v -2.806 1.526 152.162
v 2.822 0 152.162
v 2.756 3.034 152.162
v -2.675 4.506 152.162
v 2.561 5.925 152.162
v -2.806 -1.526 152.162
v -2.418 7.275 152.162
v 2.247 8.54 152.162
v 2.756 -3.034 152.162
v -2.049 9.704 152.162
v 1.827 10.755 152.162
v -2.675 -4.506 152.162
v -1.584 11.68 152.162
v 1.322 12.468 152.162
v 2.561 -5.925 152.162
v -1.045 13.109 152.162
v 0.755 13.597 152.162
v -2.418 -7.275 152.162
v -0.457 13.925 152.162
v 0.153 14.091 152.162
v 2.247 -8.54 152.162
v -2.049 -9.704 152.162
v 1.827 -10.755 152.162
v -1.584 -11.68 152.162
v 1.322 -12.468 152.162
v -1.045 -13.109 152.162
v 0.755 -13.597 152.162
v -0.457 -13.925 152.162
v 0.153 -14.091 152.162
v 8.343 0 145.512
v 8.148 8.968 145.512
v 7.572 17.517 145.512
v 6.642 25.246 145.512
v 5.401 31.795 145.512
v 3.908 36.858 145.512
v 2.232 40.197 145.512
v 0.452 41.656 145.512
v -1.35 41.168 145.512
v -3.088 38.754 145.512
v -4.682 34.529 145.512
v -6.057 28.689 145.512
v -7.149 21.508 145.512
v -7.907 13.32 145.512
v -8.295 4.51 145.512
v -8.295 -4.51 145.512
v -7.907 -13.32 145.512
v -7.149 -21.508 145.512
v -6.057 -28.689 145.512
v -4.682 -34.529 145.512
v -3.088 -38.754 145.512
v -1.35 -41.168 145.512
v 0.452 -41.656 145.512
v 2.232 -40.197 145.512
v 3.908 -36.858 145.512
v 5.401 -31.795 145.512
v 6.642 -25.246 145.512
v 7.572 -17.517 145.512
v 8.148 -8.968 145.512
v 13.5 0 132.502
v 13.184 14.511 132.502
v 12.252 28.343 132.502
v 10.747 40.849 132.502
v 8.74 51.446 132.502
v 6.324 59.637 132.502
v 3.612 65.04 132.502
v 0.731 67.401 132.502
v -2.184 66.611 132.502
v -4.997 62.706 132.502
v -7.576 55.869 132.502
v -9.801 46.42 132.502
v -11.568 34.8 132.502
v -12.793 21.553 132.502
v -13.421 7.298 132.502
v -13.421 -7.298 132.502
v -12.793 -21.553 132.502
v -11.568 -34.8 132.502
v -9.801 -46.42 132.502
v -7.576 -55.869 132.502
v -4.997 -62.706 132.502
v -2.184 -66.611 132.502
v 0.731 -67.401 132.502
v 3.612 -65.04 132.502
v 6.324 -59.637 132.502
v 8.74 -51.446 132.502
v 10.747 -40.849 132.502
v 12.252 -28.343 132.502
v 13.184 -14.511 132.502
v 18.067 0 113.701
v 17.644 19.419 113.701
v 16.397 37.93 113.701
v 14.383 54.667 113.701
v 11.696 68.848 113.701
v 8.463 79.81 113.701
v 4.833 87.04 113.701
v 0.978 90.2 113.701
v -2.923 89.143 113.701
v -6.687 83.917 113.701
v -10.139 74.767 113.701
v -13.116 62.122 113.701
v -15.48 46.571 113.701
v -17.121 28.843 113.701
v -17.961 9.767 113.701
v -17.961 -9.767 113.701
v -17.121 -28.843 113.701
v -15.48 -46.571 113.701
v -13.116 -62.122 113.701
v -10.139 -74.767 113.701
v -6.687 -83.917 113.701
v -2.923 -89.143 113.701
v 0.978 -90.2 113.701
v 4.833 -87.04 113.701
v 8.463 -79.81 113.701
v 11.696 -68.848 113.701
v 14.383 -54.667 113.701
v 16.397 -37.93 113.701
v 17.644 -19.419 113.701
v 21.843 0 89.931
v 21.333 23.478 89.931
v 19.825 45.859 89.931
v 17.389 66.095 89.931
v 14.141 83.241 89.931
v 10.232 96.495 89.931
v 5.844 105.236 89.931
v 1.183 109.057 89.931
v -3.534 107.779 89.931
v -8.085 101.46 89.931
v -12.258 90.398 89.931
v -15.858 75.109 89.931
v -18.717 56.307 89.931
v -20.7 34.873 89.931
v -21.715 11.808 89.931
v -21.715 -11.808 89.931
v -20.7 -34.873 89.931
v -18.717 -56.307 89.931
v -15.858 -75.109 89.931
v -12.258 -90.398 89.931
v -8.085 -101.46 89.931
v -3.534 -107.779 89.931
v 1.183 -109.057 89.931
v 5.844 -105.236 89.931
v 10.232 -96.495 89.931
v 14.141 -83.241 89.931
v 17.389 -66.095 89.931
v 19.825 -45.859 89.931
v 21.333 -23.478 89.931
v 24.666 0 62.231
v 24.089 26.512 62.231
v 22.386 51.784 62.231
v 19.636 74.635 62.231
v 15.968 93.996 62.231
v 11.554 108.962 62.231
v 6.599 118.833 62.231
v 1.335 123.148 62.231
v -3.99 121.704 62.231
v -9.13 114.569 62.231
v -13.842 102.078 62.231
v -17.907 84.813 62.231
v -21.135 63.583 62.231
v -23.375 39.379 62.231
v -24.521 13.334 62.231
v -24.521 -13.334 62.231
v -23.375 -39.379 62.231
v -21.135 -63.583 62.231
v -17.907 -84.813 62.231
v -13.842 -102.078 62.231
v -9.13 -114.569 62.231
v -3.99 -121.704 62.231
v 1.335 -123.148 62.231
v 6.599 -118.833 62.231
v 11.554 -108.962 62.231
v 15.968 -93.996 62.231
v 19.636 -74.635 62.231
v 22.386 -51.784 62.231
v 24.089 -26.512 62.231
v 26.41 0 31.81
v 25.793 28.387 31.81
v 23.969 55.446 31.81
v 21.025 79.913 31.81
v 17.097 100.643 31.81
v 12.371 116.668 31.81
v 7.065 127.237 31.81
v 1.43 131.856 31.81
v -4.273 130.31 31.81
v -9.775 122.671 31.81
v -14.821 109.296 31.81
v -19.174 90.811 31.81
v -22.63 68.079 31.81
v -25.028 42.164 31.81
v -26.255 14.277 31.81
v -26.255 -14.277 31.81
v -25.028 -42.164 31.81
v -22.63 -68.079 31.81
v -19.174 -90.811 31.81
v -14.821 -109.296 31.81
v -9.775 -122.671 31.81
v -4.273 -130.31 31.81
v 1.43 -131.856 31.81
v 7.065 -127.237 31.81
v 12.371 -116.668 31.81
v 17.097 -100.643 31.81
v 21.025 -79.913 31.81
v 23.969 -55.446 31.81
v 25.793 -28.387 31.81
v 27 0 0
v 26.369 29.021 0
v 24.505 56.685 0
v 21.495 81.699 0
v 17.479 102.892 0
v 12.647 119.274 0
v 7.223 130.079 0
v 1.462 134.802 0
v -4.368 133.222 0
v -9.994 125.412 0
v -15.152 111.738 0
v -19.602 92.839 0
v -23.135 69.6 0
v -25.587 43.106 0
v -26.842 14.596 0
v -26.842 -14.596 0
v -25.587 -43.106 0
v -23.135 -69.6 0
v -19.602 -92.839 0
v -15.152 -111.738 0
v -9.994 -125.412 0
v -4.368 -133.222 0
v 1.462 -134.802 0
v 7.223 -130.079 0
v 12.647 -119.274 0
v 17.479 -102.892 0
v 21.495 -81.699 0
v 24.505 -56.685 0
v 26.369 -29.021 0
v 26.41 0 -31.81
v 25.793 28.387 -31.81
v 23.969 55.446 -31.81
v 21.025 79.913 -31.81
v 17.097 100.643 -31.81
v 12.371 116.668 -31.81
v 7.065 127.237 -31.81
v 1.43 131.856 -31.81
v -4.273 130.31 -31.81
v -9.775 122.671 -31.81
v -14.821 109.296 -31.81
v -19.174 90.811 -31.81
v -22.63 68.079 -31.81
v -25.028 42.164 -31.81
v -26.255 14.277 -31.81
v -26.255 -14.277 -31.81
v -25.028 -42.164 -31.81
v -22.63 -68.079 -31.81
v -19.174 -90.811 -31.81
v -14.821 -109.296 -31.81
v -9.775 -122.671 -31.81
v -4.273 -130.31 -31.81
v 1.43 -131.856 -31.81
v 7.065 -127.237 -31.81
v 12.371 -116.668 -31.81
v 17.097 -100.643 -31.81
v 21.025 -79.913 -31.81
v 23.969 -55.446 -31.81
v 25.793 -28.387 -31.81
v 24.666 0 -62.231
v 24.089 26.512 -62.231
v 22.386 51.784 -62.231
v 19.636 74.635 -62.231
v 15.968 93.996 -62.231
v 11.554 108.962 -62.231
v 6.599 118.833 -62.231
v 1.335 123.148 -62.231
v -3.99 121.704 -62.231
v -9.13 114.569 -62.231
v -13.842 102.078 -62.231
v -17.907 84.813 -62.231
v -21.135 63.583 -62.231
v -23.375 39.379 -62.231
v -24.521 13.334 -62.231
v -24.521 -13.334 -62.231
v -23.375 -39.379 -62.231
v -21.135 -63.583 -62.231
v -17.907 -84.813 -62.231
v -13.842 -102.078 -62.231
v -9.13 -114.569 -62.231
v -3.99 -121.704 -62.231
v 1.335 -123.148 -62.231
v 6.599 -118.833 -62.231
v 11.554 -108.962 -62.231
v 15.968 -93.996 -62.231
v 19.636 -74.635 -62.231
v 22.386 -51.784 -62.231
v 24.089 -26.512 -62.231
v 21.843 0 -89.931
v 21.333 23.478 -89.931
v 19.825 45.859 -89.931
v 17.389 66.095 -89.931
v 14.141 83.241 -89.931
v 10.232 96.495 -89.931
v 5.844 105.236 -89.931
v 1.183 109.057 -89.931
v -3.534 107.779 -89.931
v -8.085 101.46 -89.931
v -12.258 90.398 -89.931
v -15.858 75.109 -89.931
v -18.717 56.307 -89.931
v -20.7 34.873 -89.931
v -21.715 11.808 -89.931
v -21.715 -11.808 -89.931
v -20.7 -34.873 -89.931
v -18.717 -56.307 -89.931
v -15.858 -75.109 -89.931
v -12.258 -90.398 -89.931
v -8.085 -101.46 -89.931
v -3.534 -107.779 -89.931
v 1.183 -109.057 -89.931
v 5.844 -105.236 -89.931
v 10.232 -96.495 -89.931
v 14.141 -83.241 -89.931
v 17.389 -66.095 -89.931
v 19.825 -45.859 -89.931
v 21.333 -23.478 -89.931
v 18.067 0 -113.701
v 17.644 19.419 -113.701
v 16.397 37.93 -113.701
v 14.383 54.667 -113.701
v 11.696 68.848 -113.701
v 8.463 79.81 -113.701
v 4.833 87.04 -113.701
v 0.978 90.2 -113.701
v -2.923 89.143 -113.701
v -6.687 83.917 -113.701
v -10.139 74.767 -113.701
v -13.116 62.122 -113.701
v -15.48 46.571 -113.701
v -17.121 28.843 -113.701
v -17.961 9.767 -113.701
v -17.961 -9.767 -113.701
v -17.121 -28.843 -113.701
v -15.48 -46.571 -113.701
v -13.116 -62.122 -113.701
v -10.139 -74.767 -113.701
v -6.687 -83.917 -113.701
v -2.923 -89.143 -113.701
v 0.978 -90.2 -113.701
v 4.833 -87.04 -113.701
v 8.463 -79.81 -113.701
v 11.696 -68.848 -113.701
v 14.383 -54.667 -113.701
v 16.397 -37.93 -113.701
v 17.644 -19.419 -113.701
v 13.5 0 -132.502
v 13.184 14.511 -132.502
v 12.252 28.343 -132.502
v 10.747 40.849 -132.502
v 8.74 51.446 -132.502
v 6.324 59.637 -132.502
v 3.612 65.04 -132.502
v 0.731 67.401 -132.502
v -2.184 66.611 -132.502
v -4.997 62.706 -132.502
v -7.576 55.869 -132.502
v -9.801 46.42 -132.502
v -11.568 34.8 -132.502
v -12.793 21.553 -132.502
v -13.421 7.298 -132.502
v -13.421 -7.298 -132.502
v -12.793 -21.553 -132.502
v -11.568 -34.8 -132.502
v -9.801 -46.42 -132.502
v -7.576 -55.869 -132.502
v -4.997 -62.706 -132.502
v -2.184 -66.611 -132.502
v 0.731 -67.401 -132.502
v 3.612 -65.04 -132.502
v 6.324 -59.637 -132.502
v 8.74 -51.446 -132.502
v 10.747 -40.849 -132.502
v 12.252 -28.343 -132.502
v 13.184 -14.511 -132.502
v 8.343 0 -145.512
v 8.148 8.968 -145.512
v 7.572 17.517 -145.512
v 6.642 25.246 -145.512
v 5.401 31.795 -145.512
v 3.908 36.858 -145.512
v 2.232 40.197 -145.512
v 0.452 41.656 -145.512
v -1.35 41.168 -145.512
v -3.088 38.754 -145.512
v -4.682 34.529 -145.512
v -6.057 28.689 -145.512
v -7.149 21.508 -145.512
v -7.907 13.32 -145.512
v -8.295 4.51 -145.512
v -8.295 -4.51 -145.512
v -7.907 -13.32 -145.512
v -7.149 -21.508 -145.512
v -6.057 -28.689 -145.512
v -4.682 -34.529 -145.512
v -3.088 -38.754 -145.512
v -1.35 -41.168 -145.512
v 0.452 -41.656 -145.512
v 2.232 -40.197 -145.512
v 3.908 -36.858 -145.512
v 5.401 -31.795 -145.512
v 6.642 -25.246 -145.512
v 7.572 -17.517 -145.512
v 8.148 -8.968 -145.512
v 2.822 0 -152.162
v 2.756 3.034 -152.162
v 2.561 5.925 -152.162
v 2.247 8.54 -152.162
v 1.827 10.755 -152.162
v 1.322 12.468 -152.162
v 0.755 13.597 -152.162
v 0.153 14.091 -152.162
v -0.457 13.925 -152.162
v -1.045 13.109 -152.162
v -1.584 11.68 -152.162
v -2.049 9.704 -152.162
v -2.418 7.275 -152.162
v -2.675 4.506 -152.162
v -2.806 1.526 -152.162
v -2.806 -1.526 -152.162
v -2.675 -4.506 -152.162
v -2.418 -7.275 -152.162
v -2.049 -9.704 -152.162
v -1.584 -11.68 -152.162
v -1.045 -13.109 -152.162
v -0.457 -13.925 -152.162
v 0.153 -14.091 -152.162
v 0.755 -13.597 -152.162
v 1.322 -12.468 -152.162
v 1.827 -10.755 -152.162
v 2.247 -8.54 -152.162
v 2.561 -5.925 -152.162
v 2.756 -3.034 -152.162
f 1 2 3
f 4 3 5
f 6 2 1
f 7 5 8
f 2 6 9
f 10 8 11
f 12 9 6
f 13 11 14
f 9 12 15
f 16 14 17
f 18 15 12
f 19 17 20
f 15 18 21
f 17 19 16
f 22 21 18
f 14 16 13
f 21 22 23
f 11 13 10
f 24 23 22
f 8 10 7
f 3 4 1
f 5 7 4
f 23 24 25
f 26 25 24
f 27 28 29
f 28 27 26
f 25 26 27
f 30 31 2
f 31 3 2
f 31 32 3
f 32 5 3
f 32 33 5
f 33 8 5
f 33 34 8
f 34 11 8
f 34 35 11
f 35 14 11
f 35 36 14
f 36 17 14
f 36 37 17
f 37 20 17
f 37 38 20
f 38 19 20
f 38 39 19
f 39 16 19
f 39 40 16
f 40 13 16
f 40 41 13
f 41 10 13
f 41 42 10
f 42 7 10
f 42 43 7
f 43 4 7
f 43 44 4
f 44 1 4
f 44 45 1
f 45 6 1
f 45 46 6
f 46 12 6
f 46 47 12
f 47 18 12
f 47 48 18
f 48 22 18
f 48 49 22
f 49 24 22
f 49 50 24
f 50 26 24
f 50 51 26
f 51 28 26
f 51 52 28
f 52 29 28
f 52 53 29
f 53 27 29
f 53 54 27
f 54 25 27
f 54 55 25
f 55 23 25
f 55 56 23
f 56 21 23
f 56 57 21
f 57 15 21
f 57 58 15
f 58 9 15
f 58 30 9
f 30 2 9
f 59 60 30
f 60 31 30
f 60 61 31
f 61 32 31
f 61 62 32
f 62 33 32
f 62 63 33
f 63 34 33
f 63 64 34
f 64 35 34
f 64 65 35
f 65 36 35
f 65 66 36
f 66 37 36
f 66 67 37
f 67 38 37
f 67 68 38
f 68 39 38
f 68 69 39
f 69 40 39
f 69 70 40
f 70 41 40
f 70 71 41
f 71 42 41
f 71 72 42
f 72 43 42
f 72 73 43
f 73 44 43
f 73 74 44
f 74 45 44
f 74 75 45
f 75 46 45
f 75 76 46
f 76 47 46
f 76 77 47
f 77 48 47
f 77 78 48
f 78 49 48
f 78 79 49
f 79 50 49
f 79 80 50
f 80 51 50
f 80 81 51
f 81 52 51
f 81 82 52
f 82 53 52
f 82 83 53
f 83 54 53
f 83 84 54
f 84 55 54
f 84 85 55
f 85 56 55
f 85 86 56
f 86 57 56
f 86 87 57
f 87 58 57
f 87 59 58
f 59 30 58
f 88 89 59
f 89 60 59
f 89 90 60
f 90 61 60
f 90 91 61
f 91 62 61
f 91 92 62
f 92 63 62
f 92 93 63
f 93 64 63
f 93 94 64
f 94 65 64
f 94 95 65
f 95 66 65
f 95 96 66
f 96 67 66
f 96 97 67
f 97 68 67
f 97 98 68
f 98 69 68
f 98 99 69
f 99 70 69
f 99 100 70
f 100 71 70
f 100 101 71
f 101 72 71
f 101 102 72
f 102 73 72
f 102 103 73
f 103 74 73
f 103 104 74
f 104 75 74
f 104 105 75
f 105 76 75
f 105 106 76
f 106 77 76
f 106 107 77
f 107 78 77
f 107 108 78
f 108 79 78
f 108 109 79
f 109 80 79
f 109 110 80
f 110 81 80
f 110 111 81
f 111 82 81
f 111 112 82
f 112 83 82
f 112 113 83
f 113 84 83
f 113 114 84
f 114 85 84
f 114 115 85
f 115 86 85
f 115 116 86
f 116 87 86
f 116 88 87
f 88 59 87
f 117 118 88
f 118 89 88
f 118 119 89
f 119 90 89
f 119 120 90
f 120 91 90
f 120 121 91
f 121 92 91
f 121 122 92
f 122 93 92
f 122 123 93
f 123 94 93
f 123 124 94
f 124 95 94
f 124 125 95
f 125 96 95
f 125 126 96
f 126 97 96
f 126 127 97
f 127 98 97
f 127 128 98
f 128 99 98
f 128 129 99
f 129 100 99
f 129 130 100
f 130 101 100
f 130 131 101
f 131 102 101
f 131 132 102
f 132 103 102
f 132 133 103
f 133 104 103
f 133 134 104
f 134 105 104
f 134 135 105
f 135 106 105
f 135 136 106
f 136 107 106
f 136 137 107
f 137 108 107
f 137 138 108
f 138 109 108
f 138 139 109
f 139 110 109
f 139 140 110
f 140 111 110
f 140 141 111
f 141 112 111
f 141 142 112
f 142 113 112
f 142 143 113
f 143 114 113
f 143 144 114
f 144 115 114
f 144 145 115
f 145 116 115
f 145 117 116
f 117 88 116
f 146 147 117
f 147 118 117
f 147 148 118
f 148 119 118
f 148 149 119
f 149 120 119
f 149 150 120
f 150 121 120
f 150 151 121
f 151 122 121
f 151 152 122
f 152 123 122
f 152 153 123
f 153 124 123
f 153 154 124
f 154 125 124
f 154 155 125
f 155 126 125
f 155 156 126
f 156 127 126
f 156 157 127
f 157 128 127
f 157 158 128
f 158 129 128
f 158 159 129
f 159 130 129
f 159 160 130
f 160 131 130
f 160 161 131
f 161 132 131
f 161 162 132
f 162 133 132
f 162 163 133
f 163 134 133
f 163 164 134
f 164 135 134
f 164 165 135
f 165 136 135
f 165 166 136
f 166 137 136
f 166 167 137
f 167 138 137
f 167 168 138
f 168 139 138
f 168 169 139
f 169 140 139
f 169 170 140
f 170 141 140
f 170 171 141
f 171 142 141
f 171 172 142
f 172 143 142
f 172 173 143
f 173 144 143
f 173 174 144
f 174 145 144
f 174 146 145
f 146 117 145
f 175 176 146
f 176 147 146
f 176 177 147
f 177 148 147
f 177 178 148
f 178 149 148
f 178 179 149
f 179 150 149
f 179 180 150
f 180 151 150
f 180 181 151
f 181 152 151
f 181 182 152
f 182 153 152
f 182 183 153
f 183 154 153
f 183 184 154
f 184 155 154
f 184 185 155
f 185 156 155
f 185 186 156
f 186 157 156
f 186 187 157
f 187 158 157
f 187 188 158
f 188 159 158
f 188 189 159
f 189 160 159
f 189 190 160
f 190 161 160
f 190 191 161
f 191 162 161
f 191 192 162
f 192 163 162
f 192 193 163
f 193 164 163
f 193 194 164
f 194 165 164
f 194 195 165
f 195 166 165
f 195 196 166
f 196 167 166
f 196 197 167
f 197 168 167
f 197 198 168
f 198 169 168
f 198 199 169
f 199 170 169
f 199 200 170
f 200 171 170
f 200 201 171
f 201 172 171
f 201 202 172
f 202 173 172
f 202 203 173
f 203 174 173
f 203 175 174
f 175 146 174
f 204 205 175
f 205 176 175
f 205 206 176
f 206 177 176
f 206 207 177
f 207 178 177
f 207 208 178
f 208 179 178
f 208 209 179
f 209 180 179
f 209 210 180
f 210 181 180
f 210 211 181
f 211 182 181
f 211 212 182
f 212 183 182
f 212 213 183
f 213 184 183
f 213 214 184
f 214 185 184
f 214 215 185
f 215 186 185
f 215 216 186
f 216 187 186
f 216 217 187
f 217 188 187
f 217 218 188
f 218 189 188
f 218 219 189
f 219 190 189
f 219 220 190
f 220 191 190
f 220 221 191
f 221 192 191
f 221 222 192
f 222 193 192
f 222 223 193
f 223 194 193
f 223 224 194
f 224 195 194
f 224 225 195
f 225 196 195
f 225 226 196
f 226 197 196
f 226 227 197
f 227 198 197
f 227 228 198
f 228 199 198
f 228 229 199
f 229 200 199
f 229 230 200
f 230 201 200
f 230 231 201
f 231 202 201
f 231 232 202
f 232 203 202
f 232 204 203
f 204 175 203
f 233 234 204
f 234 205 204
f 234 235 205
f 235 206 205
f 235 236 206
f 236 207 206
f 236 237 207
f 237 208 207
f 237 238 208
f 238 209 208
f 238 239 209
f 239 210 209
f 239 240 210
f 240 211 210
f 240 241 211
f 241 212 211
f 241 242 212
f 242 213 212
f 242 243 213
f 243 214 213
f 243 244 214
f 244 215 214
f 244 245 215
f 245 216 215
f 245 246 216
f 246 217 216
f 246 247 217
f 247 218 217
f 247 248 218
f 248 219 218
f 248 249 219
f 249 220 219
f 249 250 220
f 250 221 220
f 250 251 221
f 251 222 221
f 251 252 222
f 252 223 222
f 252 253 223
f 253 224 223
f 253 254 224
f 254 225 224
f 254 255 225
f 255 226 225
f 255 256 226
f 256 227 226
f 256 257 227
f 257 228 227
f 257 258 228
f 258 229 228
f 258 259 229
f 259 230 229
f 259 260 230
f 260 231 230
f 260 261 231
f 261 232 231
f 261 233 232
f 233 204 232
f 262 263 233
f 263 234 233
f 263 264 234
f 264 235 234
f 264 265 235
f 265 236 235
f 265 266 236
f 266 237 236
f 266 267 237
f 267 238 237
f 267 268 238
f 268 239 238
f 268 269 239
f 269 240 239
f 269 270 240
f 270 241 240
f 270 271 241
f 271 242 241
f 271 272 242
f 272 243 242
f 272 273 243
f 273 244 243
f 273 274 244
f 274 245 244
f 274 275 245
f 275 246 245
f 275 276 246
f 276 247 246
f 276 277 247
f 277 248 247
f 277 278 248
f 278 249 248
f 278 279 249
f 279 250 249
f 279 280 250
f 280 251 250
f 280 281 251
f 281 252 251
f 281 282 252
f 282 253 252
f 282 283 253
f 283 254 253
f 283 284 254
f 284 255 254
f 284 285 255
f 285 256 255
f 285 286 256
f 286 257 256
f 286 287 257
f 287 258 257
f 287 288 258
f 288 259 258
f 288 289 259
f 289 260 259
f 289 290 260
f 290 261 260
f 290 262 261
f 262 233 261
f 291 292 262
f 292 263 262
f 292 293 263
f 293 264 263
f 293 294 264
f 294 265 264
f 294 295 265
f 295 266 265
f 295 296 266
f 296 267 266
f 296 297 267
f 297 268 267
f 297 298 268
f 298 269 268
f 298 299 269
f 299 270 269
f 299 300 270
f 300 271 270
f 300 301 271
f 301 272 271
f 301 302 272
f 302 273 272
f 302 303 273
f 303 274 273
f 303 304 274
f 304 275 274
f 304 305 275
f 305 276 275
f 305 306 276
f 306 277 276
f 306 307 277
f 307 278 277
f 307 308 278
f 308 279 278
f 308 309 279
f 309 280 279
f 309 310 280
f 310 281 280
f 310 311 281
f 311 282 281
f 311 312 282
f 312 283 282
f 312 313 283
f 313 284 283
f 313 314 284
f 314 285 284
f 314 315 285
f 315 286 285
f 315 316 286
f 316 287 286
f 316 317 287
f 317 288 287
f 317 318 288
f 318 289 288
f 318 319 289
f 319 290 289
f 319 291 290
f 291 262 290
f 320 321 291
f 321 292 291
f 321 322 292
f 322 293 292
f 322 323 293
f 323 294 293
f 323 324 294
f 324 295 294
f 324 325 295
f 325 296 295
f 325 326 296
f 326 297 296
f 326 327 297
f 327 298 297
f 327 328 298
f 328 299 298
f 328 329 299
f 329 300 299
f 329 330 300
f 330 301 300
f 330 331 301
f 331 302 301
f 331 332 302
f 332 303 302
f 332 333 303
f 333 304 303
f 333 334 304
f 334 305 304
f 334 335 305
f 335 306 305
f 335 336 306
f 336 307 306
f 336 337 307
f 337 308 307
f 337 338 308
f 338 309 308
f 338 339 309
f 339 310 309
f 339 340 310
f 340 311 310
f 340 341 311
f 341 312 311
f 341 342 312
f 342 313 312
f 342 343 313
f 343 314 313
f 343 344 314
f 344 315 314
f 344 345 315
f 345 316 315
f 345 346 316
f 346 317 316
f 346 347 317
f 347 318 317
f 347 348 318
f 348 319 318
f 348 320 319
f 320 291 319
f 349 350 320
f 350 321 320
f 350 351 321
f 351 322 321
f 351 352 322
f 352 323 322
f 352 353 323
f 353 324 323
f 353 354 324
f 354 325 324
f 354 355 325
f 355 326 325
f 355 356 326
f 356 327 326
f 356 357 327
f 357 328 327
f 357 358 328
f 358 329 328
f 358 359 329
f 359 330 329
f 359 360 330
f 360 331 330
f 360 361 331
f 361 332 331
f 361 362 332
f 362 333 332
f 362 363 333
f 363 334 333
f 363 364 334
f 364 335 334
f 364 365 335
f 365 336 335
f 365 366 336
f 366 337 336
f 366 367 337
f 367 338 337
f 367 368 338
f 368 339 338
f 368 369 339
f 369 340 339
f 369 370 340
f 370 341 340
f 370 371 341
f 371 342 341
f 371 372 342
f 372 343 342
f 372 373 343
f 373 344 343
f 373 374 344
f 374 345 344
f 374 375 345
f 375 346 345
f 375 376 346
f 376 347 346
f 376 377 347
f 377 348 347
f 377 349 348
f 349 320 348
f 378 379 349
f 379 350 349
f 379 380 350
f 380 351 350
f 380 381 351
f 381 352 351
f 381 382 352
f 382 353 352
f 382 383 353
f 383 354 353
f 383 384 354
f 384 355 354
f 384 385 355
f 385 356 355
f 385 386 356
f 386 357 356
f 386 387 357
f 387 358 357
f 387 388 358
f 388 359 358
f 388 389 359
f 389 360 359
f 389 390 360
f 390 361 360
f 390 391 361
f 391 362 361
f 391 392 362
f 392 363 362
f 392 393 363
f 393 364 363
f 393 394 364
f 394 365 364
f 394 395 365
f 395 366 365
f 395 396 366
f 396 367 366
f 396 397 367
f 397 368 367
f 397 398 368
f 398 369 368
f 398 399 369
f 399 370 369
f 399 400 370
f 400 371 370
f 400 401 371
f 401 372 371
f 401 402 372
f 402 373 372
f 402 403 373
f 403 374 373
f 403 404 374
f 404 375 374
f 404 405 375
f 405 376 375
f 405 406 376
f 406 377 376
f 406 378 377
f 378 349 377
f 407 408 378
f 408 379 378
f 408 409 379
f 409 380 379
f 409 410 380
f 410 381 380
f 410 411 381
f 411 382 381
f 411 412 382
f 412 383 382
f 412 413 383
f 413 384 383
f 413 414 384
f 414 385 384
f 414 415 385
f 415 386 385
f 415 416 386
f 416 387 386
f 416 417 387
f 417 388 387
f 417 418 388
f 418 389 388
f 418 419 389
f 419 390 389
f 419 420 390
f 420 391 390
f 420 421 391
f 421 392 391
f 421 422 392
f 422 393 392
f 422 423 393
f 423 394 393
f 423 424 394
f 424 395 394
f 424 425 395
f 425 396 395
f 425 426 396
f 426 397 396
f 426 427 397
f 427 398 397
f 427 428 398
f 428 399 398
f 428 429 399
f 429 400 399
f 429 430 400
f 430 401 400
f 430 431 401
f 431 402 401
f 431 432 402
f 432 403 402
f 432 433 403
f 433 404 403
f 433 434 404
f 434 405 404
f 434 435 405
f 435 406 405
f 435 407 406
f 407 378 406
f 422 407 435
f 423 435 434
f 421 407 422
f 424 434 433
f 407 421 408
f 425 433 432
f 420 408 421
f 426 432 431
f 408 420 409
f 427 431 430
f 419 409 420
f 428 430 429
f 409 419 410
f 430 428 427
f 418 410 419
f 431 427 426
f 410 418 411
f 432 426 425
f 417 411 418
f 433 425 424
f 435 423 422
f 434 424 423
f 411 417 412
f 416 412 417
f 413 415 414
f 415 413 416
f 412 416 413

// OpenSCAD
// Generated by SolidPython 1.0.1 on 2020-07-29 00:46:45


scale(v = [3, 15, 17]) {
	sphere(r = 9);
}
/***********************************************
*********      SolidPython code:      **********
************************************************
 
# import packages: SolidPython
from solid import *
from solid.utils import *
from itertools import chain, combinations, permutations


class Resize:

    def __init__(self, scad_file):
        self.scad_file = scad_file
        #self.scad_file = import_scad(scad_file)
        # cone/cylinder param:
        self.r1 = 0
        self.r2 = 0
        self.h = 0
        # rectangular prism param:
        self.w = 0
        self.l = 0
        # ellipse param:
        self.r = 0

    # import OpenScad code (file name corresponds to shape)


    # classify shape + parameters
    def assign(self, param1, param2, param3):
        if self.scad_file == 'cone.scad':
            self.r1 = param1
            self.r2 = param2
            self.h = param3
        elif self.scad_file == 'cylinder.scad':
            self.r1 = param1
            self.r2 = param2
            self.h = param3
        elif self.scad_file == 'rectangularPrism.scad':
            self.h = param1
            self.l = param2
            self.w = param3
        else:
            self.r = param1
            self.h = param2

    # resize parameters
    def iterate(self):
        x = range(3, 20, 2)
        i = 1
        if self.scad_file == 'cone.scad':
            tempList = list(permutations(x, 2))
            for temp in tempList:
                param1 = temp[0]
                param2 = temp[1]
                filepath = 'produced_scad_files/' + 'cone' + str(param1) + '_' + str(param2) + '_' + '.scad'
                scad_render_to_file(cylinder(h=param1, r1=param2, r2=0), filepath)

        elif self.scad_file == 'cylinder.scad':
            tempList = list(permutations(x, 3))
            for temp in tempList:
                param1 = temp[0]
                param2 = temp[1]
                filepath = 'produced_scad_files/' + 'cylinder' + str(param1) + '_' + str(param2) + '_' + '.scad'
                scad_render_to_file(cylinder(h=param1, r1=param2, r2=param2), filepath)

        elif self.scad_file == 'rectangularPrism.scad':
            tempList = list(permutations(x, 3))
            for temp in tempList:
                param1 = temp[0]
                param2 = temp[1]
                param3 = temp[2]
                filepath = 'produced_scad_files/' + 'rectangularPrism' + str(param1) + '_' + str(param2) + '_' + str(
                    param3) + '.scad'
                scad_render_to_file(cube(size=(param1, param2, param3)), filepath)

        elif self.scad_file == 'ellipse.scad':
            tempList = list(permutations(x, 4))
            for temp in tempList:
                param1 = temp[0]
                param2 = temp[1]
                param3 = temp[2]
                param4 = temp[3]
                filepath = 'produced_scad_files/' + 'ellipse' + str(param1) + '_' + str(param2) + '_' + str(param3) + '_' + str(param4) + '.scad'
                scad_render_to_file(scale([param1, param2, param3])(sphere(r=param4)), filepath)

    def render_to_scadfile(self):
        scad_render_to_file(scad, 'example.scad') 
 
************************************************/
